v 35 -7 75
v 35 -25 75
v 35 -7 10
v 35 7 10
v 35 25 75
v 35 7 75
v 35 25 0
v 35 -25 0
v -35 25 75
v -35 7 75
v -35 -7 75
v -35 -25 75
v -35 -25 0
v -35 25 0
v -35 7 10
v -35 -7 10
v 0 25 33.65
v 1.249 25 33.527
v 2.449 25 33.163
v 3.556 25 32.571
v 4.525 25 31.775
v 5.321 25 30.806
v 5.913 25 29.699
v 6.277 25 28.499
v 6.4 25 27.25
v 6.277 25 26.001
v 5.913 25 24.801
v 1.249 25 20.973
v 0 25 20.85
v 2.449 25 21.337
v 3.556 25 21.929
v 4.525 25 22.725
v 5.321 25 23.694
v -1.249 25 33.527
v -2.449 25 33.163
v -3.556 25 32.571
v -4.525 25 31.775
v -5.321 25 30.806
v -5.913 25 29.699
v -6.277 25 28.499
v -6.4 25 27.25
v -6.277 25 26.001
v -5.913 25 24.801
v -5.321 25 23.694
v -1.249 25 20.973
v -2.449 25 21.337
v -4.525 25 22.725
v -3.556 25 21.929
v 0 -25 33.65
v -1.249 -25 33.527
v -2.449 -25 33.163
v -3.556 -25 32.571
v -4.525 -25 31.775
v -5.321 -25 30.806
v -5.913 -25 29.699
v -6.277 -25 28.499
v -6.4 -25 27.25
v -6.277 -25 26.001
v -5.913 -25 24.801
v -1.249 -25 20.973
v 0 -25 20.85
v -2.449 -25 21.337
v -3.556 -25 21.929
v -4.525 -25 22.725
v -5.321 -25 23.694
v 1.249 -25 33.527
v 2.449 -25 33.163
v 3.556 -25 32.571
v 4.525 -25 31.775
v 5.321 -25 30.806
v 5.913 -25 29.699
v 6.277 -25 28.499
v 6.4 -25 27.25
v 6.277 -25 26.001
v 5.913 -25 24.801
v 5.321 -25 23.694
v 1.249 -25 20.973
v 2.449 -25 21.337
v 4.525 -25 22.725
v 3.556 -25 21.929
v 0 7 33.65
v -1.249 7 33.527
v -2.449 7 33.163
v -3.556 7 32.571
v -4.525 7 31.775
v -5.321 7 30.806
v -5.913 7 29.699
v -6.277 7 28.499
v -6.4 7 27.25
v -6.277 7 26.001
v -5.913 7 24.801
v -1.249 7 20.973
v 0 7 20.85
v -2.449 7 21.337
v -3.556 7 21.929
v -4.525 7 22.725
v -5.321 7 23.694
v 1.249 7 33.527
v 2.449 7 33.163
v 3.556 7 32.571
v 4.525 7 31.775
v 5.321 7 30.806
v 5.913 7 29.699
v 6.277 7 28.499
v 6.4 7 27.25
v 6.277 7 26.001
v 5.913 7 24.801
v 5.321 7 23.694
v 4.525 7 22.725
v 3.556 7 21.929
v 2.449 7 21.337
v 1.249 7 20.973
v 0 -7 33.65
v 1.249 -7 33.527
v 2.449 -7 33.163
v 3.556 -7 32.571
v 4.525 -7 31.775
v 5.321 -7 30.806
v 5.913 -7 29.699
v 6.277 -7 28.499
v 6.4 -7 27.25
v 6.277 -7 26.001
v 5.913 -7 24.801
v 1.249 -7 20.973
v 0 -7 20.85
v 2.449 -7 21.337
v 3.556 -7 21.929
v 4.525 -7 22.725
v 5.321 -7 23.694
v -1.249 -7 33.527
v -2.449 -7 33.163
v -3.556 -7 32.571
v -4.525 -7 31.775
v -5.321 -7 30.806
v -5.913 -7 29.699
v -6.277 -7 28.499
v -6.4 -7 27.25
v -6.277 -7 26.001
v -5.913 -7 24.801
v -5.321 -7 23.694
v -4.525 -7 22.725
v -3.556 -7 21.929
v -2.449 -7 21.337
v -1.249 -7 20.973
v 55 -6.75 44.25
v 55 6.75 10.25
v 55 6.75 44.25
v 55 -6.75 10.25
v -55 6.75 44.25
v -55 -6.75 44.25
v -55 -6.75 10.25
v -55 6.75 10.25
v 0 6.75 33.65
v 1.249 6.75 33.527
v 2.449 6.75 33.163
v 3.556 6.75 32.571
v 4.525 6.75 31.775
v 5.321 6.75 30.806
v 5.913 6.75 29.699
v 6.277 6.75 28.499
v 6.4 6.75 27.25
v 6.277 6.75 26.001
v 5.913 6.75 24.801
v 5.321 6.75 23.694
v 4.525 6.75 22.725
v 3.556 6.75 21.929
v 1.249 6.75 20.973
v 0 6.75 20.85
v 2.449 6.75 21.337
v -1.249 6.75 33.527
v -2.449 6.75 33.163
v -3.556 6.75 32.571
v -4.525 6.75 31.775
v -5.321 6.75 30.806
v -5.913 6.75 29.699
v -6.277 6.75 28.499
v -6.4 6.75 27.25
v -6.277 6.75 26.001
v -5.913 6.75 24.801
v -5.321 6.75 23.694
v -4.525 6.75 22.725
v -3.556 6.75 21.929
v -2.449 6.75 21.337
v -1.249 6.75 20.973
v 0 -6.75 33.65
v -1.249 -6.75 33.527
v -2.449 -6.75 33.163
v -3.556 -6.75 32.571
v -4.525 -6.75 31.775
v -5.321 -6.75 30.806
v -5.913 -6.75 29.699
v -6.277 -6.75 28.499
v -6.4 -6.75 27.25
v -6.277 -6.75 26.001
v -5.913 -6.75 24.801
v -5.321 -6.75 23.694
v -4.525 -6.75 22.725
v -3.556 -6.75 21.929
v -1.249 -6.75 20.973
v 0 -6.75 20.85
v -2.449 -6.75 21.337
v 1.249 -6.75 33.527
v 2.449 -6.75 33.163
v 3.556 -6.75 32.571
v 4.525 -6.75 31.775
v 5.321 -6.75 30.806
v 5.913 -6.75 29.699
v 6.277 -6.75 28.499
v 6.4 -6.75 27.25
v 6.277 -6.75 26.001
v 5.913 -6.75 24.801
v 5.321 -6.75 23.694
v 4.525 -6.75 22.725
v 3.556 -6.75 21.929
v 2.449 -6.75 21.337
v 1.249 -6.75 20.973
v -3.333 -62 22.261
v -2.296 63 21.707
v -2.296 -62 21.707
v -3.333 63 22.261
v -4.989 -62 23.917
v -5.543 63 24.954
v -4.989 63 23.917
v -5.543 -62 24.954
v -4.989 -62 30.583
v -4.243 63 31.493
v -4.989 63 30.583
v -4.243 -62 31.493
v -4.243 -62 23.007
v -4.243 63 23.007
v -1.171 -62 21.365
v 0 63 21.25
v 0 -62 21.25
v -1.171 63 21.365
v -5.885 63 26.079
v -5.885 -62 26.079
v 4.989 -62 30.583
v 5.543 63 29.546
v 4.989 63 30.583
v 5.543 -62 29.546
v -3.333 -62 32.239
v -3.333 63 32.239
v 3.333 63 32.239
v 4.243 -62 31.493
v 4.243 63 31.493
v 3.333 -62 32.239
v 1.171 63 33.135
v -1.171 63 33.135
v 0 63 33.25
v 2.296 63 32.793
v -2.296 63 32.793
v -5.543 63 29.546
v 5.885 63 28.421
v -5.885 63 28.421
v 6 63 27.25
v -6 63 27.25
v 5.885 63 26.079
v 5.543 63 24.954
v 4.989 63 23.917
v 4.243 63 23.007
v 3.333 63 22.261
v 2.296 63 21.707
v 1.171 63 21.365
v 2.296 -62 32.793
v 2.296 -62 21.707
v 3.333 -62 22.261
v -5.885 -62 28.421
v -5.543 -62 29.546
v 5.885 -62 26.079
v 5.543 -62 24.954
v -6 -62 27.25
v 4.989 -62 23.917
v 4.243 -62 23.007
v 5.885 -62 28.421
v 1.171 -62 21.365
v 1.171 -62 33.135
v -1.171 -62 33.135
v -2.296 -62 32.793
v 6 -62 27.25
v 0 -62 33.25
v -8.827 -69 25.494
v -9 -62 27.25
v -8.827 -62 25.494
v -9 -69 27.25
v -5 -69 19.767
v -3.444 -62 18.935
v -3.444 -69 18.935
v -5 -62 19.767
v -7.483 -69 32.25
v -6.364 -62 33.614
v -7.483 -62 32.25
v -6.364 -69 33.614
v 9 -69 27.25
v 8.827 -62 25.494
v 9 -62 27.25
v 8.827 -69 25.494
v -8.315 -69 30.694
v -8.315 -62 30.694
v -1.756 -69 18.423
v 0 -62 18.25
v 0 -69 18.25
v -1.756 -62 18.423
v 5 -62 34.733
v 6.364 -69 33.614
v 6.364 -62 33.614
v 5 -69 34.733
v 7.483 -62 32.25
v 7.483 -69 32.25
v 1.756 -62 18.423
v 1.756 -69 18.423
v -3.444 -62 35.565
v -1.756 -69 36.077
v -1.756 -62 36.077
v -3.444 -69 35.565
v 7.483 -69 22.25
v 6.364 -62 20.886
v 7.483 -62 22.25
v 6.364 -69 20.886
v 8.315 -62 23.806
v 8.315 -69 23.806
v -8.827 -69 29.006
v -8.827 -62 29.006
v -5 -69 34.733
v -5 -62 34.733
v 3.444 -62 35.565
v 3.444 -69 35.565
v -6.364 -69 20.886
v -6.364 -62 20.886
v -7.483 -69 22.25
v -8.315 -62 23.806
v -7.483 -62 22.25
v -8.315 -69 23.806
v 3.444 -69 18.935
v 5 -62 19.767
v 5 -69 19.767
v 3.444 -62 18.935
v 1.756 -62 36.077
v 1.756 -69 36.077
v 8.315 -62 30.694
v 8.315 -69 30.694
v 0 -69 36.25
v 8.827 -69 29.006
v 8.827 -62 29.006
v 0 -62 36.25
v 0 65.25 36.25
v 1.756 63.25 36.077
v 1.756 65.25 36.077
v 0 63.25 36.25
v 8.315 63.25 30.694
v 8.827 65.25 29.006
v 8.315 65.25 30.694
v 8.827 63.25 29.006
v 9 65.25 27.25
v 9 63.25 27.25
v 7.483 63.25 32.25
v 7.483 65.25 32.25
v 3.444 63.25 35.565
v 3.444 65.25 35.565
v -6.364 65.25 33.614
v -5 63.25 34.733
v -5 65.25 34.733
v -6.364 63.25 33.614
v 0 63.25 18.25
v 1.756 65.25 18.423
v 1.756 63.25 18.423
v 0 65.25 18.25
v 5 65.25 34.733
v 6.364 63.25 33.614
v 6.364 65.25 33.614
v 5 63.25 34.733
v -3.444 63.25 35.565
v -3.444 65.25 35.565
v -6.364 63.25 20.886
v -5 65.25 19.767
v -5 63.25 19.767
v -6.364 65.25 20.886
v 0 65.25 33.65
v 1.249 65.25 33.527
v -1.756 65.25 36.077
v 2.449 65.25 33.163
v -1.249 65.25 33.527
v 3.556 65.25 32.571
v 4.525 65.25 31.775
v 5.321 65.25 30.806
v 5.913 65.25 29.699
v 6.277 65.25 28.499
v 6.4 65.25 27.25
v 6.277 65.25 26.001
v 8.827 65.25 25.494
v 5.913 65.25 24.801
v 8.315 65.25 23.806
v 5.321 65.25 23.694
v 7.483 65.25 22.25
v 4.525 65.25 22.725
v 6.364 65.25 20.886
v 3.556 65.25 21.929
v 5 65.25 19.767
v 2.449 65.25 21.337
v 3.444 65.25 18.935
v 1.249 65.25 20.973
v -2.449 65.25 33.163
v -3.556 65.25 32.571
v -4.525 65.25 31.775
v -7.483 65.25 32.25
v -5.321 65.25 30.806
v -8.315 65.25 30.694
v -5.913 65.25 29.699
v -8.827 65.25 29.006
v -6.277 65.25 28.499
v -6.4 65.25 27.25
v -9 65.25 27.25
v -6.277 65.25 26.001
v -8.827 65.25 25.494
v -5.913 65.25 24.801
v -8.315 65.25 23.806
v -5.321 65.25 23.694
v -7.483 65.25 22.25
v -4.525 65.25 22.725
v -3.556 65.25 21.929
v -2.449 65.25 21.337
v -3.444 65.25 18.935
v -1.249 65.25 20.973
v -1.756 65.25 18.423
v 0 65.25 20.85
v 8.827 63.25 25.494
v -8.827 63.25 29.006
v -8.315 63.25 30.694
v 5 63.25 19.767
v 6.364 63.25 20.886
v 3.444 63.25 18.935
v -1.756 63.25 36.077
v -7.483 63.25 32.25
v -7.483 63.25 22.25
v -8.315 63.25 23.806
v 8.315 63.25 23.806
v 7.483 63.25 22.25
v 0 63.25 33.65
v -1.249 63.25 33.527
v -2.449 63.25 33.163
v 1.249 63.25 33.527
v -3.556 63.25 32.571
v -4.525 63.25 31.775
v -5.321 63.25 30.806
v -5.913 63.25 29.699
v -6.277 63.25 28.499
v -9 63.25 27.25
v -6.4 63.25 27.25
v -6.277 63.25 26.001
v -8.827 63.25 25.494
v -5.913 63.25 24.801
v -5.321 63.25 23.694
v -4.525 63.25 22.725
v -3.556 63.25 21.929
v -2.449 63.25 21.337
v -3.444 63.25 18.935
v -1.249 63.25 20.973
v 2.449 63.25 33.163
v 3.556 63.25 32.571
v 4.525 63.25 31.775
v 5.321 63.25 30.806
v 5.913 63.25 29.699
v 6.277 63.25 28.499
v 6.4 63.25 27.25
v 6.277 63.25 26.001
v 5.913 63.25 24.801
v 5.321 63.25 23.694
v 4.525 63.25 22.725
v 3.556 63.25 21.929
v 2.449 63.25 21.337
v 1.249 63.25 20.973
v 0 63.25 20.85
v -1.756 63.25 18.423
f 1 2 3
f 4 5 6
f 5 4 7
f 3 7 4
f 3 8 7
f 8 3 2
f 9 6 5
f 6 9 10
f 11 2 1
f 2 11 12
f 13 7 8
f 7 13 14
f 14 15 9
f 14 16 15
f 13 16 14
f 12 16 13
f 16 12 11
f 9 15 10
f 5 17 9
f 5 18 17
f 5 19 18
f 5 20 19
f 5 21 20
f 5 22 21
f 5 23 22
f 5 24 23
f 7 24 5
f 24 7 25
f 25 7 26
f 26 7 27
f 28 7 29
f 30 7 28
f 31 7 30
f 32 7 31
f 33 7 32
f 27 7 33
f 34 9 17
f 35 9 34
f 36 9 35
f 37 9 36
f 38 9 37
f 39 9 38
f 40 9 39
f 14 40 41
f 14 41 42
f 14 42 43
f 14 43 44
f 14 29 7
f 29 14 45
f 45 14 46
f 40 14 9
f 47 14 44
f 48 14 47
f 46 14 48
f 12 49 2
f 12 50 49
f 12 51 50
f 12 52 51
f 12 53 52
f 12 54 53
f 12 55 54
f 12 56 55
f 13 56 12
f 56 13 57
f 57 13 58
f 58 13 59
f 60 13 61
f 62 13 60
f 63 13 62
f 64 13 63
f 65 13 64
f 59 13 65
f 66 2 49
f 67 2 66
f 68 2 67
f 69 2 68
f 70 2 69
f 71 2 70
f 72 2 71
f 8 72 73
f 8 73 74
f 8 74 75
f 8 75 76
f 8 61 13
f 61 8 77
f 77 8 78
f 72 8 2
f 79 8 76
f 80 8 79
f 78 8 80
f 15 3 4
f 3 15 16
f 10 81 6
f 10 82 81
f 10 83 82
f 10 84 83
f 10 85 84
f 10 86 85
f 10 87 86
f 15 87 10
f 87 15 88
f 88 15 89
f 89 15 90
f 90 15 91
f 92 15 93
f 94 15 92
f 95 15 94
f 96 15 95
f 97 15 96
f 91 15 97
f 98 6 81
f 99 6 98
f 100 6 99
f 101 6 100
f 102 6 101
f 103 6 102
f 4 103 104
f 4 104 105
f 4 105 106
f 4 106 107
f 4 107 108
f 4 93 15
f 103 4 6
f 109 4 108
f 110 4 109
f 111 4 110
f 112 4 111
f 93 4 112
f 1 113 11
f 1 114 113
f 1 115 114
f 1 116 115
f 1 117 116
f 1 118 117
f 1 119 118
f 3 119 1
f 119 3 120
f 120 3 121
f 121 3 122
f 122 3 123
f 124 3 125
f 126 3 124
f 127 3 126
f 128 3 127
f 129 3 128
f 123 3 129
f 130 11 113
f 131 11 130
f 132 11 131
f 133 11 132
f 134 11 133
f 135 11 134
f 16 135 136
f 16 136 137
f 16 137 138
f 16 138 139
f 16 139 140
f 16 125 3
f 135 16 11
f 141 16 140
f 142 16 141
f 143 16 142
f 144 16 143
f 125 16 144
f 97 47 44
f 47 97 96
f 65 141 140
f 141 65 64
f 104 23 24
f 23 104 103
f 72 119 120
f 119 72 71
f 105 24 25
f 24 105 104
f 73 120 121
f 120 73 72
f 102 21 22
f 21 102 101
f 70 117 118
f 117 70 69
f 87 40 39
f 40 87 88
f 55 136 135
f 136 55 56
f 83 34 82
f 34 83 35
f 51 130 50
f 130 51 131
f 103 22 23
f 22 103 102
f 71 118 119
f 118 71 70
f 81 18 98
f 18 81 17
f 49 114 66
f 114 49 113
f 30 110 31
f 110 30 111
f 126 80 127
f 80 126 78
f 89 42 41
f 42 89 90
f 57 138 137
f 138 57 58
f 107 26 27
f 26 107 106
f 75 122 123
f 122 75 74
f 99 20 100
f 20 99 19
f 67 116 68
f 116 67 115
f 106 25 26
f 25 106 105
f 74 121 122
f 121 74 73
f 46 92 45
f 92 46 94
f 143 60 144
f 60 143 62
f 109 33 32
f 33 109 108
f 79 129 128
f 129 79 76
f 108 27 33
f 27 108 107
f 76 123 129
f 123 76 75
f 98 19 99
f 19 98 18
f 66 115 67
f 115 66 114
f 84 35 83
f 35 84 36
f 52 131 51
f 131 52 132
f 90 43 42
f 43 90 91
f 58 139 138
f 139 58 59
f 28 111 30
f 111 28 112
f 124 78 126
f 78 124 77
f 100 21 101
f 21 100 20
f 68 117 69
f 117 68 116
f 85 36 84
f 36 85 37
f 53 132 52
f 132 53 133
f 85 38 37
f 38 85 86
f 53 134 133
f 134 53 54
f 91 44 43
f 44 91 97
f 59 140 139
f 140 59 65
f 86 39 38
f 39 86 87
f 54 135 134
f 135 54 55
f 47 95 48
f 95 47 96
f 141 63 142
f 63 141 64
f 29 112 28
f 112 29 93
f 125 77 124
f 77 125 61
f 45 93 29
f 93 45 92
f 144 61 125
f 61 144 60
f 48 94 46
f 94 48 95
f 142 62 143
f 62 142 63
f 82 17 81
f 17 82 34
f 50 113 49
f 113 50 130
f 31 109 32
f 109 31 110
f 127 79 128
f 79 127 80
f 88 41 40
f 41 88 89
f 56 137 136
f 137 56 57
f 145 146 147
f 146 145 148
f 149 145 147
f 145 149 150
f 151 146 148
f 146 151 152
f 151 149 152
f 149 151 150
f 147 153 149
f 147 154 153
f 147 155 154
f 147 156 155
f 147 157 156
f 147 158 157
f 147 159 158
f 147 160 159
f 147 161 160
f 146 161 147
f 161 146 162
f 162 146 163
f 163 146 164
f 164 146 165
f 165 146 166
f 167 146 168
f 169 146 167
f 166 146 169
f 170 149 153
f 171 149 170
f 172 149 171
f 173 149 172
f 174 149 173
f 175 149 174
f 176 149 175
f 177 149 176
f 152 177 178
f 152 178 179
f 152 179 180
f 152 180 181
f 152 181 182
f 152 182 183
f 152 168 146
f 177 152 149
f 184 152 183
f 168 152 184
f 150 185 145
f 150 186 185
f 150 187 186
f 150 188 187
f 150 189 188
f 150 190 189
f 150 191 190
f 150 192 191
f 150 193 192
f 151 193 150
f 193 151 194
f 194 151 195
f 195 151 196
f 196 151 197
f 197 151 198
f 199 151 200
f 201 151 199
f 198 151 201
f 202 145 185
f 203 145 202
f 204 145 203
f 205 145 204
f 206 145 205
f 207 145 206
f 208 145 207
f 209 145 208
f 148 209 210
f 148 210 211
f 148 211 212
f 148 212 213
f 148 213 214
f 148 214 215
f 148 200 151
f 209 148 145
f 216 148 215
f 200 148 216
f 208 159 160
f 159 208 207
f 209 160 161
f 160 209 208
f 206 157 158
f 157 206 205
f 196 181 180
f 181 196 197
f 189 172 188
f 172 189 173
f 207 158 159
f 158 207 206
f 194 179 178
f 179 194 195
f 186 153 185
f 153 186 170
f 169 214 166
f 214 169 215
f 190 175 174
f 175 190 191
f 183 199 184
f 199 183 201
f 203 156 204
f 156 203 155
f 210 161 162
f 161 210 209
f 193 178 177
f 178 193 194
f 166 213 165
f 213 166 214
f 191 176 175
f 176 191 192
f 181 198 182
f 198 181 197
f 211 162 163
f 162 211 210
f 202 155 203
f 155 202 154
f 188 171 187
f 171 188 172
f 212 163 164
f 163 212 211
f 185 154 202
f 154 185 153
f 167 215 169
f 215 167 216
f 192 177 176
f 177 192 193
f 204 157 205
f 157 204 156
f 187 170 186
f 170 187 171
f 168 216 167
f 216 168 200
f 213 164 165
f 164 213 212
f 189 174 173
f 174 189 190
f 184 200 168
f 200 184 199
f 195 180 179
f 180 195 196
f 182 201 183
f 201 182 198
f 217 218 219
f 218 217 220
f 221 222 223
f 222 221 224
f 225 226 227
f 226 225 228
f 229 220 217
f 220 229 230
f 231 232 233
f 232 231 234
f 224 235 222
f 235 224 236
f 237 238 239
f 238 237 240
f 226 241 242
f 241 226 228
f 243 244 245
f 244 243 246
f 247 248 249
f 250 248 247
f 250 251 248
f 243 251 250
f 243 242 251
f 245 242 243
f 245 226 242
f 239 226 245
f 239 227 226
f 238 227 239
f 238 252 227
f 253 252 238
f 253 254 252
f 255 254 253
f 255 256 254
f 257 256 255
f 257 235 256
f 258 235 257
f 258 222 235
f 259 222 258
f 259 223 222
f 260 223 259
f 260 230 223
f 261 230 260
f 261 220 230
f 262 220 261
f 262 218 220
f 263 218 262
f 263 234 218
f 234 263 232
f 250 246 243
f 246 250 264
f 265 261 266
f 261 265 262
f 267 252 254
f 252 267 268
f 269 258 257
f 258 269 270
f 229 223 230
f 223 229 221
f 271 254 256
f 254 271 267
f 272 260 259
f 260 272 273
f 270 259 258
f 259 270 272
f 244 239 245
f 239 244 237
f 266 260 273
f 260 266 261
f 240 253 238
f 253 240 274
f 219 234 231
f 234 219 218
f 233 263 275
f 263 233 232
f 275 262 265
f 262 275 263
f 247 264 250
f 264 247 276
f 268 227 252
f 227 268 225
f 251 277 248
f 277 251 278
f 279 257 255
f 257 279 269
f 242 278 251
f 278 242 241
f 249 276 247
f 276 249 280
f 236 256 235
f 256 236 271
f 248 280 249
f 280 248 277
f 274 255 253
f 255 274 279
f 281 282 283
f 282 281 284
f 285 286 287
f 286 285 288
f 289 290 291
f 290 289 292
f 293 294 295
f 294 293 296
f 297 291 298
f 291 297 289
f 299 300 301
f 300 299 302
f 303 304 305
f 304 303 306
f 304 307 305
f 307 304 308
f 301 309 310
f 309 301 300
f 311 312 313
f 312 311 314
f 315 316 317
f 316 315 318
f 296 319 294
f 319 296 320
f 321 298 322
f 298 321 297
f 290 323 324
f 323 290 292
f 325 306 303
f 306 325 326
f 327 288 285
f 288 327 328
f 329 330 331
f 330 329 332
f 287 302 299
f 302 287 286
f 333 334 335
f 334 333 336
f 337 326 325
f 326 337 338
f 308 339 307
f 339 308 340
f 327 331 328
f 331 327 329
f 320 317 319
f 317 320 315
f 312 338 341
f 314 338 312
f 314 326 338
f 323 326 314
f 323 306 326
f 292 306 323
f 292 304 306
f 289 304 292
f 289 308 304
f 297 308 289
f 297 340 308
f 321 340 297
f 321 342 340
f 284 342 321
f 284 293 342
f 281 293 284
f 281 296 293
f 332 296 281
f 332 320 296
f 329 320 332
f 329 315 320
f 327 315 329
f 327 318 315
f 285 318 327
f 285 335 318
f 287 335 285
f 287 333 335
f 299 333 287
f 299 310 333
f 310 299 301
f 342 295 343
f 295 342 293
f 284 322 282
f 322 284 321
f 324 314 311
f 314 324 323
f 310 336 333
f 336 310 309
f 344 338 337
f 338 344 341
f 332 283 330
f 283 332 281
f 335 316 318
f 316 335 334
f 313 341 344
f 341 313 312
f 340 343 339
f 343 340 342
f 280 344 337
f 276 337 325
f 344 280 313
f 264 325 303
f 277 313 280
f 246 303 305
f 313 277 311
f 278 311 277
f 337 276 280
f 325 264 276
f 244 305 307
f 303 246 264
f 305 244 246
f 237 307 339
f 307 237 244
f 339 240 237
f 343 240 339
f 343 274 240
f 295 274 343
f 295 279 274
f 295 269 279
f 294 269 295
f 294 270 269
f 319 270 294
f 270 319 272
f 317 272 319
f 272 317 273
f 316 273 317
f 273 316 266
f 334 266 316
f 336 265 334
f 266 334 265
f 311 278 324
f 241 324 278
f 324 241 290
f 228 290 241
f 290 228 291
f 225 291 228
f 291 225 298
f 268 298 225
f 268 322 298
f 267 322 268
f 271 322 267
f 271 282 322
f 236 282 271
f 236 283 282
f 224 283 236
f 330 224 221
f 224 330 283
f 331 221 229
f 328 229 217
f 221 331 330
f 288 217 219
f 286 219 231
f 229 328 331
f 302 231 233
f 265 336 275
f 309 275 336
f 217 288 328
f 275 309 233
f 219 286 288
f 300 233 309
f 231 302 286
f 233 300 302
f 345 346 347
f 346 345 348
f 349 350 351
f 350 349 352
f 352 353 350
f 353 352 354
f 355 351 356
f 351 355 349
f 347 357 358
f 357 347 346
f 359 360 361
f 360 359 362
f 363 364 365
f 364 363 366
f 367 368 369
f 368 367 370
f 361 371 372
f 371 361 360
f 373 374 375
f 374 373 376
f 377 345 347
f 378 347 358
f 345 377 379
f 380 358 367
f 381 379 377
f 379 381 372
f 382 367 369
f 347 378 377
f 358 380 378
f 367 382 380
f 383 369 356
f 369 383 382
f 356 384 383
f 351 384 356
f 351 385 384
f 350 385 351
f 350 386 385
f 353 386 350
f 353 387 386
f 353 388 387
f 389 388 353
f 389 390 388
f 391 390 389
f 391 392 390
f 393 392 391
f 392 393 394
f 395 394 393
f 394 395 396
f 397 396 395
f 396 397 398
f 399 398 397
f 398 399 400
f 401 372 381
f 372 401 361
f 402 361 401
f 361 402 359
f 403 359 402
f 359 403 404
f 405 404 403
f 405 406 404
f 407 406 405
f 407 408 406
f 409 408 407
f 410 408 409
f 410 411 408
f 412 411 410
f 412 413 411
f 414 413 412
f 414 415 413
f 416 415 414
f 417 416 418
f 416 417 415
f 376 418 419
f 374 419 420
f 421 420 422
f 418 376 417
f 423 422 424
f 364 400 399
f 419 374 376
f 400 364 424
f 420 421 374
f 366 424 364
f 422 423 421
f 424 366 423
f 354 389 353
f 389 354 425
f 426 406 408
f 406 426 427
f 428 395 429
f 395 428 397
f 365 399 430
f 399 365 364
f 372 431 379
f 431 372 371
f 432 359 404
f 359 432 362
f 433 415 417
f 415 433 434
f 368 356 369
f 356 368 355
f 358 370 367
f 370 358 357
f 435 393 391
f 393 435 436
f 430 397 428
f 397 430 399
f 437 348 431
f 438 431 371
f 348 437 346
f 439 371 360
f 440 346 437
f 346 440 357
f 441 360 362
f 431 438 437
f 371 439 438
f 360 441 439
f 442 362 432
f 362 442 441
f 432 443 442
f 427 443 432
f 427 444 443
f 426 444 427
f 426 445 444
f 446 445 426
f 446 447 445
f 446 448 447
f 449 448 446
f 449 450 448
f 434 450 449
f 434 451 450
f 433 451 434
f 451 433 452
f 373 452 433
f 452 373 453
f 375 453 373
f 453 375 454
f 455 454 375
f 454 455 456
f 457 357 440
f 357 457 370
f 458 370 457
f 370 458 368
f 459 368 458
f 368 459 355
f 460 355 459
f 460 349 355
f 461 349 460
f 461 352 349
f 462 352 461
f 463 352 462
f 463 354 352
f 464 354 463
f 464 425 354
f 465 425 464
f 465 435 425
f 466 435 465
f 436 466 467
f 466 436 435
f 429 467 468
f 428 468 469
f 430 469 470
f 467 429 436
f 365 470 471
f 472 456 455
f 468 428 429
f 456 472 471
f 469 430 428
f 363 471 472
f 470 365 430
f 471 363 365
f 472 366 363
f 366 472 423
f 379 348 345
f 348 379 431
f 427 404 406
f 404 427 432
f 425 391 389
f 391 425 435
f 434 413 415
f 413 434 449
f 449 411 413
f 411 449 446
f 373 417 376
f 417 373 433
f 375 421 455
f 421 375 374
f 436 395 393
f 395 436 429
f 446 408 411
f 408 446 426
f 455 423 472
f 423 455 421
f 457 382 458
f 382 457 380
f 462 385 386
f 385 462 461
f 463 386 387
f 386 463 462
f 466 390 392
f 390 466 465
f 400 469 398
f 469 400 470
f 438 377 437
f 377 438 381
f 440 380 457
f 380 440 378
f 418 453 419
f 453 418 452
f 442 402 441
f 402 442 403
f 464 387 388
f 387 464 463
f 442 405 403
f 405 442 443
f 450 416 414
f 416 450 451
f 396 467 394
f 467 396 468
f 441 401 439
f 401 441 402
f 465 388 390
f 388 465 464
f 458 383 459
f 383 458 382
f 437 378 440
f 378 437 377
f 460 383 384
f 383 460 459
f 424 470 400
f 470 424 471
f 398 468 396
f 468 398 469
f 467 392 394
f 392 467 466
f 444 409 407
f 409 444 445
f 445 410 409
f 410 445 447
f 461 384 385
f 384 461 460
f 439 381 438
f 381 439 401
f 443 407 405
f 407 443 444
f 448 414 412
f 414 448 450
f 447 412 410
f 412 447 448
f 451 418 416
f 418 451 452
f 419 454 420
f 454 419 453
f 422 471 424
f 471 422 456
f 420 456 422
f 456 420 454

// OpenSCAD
$fn = 32;

// ------------------------------------------------------------------------
// Clevis joint: 70 mm clevis, pin d12
// Every part is its own module, assembly() places them once.
// ------------------------------------------------------------------------

// --- part 1 ---
module clevis() {
  difference() {
    translate([-35, -25, 0]) cube([70, 50, 75]);
    translate([-36, -7, 10]) cube([72, 14, 66]);
    translate([0, 0, 27.25]) rotate([90, 0, 0]) cylinder(h = 52, d = 12.8, center = true);
  }
}

// --- part 2 ---
module eye() {
  difference() {
    translate([-55, -6.75, 0]) cube([110, 13.5, 34]);
    translate([0, 0, 17]) rotate([90, 0, 0]) cylinder(h = 15.5, d = 12.8, center = true);
  }
}

// --- part 3 ---
module pin() {
  rotate([0, 90, 0]) cylinder(h = 126, d = 12, center = true);
  translate([-69, 0, 0]) rotate([0, 90, 0]) cylinder(h = 7, d = 18);
}

// --- part 4 ---
module retainer() {
  difference() {
      translate([0, 0, 0]) cylinder(h = 2, d = 18);
      translate([0, 0, -1]) cylinder(h = 4, d = 12.8);
    }
}

// --- assembly ---
module assembly() {
  translate([0, 0, 0]) rotate([0, 0, 0]) clevis();
  translate([0, 0, 10.25]) rotate([0, 0, 0]) eye();
  translate([0, 0, 27.25]) rotate([0, 0, 90]) pin();
  translate([0, 65.25, 27.25]) rotate([90, 0, 0]) retainer();
}

assembly();
